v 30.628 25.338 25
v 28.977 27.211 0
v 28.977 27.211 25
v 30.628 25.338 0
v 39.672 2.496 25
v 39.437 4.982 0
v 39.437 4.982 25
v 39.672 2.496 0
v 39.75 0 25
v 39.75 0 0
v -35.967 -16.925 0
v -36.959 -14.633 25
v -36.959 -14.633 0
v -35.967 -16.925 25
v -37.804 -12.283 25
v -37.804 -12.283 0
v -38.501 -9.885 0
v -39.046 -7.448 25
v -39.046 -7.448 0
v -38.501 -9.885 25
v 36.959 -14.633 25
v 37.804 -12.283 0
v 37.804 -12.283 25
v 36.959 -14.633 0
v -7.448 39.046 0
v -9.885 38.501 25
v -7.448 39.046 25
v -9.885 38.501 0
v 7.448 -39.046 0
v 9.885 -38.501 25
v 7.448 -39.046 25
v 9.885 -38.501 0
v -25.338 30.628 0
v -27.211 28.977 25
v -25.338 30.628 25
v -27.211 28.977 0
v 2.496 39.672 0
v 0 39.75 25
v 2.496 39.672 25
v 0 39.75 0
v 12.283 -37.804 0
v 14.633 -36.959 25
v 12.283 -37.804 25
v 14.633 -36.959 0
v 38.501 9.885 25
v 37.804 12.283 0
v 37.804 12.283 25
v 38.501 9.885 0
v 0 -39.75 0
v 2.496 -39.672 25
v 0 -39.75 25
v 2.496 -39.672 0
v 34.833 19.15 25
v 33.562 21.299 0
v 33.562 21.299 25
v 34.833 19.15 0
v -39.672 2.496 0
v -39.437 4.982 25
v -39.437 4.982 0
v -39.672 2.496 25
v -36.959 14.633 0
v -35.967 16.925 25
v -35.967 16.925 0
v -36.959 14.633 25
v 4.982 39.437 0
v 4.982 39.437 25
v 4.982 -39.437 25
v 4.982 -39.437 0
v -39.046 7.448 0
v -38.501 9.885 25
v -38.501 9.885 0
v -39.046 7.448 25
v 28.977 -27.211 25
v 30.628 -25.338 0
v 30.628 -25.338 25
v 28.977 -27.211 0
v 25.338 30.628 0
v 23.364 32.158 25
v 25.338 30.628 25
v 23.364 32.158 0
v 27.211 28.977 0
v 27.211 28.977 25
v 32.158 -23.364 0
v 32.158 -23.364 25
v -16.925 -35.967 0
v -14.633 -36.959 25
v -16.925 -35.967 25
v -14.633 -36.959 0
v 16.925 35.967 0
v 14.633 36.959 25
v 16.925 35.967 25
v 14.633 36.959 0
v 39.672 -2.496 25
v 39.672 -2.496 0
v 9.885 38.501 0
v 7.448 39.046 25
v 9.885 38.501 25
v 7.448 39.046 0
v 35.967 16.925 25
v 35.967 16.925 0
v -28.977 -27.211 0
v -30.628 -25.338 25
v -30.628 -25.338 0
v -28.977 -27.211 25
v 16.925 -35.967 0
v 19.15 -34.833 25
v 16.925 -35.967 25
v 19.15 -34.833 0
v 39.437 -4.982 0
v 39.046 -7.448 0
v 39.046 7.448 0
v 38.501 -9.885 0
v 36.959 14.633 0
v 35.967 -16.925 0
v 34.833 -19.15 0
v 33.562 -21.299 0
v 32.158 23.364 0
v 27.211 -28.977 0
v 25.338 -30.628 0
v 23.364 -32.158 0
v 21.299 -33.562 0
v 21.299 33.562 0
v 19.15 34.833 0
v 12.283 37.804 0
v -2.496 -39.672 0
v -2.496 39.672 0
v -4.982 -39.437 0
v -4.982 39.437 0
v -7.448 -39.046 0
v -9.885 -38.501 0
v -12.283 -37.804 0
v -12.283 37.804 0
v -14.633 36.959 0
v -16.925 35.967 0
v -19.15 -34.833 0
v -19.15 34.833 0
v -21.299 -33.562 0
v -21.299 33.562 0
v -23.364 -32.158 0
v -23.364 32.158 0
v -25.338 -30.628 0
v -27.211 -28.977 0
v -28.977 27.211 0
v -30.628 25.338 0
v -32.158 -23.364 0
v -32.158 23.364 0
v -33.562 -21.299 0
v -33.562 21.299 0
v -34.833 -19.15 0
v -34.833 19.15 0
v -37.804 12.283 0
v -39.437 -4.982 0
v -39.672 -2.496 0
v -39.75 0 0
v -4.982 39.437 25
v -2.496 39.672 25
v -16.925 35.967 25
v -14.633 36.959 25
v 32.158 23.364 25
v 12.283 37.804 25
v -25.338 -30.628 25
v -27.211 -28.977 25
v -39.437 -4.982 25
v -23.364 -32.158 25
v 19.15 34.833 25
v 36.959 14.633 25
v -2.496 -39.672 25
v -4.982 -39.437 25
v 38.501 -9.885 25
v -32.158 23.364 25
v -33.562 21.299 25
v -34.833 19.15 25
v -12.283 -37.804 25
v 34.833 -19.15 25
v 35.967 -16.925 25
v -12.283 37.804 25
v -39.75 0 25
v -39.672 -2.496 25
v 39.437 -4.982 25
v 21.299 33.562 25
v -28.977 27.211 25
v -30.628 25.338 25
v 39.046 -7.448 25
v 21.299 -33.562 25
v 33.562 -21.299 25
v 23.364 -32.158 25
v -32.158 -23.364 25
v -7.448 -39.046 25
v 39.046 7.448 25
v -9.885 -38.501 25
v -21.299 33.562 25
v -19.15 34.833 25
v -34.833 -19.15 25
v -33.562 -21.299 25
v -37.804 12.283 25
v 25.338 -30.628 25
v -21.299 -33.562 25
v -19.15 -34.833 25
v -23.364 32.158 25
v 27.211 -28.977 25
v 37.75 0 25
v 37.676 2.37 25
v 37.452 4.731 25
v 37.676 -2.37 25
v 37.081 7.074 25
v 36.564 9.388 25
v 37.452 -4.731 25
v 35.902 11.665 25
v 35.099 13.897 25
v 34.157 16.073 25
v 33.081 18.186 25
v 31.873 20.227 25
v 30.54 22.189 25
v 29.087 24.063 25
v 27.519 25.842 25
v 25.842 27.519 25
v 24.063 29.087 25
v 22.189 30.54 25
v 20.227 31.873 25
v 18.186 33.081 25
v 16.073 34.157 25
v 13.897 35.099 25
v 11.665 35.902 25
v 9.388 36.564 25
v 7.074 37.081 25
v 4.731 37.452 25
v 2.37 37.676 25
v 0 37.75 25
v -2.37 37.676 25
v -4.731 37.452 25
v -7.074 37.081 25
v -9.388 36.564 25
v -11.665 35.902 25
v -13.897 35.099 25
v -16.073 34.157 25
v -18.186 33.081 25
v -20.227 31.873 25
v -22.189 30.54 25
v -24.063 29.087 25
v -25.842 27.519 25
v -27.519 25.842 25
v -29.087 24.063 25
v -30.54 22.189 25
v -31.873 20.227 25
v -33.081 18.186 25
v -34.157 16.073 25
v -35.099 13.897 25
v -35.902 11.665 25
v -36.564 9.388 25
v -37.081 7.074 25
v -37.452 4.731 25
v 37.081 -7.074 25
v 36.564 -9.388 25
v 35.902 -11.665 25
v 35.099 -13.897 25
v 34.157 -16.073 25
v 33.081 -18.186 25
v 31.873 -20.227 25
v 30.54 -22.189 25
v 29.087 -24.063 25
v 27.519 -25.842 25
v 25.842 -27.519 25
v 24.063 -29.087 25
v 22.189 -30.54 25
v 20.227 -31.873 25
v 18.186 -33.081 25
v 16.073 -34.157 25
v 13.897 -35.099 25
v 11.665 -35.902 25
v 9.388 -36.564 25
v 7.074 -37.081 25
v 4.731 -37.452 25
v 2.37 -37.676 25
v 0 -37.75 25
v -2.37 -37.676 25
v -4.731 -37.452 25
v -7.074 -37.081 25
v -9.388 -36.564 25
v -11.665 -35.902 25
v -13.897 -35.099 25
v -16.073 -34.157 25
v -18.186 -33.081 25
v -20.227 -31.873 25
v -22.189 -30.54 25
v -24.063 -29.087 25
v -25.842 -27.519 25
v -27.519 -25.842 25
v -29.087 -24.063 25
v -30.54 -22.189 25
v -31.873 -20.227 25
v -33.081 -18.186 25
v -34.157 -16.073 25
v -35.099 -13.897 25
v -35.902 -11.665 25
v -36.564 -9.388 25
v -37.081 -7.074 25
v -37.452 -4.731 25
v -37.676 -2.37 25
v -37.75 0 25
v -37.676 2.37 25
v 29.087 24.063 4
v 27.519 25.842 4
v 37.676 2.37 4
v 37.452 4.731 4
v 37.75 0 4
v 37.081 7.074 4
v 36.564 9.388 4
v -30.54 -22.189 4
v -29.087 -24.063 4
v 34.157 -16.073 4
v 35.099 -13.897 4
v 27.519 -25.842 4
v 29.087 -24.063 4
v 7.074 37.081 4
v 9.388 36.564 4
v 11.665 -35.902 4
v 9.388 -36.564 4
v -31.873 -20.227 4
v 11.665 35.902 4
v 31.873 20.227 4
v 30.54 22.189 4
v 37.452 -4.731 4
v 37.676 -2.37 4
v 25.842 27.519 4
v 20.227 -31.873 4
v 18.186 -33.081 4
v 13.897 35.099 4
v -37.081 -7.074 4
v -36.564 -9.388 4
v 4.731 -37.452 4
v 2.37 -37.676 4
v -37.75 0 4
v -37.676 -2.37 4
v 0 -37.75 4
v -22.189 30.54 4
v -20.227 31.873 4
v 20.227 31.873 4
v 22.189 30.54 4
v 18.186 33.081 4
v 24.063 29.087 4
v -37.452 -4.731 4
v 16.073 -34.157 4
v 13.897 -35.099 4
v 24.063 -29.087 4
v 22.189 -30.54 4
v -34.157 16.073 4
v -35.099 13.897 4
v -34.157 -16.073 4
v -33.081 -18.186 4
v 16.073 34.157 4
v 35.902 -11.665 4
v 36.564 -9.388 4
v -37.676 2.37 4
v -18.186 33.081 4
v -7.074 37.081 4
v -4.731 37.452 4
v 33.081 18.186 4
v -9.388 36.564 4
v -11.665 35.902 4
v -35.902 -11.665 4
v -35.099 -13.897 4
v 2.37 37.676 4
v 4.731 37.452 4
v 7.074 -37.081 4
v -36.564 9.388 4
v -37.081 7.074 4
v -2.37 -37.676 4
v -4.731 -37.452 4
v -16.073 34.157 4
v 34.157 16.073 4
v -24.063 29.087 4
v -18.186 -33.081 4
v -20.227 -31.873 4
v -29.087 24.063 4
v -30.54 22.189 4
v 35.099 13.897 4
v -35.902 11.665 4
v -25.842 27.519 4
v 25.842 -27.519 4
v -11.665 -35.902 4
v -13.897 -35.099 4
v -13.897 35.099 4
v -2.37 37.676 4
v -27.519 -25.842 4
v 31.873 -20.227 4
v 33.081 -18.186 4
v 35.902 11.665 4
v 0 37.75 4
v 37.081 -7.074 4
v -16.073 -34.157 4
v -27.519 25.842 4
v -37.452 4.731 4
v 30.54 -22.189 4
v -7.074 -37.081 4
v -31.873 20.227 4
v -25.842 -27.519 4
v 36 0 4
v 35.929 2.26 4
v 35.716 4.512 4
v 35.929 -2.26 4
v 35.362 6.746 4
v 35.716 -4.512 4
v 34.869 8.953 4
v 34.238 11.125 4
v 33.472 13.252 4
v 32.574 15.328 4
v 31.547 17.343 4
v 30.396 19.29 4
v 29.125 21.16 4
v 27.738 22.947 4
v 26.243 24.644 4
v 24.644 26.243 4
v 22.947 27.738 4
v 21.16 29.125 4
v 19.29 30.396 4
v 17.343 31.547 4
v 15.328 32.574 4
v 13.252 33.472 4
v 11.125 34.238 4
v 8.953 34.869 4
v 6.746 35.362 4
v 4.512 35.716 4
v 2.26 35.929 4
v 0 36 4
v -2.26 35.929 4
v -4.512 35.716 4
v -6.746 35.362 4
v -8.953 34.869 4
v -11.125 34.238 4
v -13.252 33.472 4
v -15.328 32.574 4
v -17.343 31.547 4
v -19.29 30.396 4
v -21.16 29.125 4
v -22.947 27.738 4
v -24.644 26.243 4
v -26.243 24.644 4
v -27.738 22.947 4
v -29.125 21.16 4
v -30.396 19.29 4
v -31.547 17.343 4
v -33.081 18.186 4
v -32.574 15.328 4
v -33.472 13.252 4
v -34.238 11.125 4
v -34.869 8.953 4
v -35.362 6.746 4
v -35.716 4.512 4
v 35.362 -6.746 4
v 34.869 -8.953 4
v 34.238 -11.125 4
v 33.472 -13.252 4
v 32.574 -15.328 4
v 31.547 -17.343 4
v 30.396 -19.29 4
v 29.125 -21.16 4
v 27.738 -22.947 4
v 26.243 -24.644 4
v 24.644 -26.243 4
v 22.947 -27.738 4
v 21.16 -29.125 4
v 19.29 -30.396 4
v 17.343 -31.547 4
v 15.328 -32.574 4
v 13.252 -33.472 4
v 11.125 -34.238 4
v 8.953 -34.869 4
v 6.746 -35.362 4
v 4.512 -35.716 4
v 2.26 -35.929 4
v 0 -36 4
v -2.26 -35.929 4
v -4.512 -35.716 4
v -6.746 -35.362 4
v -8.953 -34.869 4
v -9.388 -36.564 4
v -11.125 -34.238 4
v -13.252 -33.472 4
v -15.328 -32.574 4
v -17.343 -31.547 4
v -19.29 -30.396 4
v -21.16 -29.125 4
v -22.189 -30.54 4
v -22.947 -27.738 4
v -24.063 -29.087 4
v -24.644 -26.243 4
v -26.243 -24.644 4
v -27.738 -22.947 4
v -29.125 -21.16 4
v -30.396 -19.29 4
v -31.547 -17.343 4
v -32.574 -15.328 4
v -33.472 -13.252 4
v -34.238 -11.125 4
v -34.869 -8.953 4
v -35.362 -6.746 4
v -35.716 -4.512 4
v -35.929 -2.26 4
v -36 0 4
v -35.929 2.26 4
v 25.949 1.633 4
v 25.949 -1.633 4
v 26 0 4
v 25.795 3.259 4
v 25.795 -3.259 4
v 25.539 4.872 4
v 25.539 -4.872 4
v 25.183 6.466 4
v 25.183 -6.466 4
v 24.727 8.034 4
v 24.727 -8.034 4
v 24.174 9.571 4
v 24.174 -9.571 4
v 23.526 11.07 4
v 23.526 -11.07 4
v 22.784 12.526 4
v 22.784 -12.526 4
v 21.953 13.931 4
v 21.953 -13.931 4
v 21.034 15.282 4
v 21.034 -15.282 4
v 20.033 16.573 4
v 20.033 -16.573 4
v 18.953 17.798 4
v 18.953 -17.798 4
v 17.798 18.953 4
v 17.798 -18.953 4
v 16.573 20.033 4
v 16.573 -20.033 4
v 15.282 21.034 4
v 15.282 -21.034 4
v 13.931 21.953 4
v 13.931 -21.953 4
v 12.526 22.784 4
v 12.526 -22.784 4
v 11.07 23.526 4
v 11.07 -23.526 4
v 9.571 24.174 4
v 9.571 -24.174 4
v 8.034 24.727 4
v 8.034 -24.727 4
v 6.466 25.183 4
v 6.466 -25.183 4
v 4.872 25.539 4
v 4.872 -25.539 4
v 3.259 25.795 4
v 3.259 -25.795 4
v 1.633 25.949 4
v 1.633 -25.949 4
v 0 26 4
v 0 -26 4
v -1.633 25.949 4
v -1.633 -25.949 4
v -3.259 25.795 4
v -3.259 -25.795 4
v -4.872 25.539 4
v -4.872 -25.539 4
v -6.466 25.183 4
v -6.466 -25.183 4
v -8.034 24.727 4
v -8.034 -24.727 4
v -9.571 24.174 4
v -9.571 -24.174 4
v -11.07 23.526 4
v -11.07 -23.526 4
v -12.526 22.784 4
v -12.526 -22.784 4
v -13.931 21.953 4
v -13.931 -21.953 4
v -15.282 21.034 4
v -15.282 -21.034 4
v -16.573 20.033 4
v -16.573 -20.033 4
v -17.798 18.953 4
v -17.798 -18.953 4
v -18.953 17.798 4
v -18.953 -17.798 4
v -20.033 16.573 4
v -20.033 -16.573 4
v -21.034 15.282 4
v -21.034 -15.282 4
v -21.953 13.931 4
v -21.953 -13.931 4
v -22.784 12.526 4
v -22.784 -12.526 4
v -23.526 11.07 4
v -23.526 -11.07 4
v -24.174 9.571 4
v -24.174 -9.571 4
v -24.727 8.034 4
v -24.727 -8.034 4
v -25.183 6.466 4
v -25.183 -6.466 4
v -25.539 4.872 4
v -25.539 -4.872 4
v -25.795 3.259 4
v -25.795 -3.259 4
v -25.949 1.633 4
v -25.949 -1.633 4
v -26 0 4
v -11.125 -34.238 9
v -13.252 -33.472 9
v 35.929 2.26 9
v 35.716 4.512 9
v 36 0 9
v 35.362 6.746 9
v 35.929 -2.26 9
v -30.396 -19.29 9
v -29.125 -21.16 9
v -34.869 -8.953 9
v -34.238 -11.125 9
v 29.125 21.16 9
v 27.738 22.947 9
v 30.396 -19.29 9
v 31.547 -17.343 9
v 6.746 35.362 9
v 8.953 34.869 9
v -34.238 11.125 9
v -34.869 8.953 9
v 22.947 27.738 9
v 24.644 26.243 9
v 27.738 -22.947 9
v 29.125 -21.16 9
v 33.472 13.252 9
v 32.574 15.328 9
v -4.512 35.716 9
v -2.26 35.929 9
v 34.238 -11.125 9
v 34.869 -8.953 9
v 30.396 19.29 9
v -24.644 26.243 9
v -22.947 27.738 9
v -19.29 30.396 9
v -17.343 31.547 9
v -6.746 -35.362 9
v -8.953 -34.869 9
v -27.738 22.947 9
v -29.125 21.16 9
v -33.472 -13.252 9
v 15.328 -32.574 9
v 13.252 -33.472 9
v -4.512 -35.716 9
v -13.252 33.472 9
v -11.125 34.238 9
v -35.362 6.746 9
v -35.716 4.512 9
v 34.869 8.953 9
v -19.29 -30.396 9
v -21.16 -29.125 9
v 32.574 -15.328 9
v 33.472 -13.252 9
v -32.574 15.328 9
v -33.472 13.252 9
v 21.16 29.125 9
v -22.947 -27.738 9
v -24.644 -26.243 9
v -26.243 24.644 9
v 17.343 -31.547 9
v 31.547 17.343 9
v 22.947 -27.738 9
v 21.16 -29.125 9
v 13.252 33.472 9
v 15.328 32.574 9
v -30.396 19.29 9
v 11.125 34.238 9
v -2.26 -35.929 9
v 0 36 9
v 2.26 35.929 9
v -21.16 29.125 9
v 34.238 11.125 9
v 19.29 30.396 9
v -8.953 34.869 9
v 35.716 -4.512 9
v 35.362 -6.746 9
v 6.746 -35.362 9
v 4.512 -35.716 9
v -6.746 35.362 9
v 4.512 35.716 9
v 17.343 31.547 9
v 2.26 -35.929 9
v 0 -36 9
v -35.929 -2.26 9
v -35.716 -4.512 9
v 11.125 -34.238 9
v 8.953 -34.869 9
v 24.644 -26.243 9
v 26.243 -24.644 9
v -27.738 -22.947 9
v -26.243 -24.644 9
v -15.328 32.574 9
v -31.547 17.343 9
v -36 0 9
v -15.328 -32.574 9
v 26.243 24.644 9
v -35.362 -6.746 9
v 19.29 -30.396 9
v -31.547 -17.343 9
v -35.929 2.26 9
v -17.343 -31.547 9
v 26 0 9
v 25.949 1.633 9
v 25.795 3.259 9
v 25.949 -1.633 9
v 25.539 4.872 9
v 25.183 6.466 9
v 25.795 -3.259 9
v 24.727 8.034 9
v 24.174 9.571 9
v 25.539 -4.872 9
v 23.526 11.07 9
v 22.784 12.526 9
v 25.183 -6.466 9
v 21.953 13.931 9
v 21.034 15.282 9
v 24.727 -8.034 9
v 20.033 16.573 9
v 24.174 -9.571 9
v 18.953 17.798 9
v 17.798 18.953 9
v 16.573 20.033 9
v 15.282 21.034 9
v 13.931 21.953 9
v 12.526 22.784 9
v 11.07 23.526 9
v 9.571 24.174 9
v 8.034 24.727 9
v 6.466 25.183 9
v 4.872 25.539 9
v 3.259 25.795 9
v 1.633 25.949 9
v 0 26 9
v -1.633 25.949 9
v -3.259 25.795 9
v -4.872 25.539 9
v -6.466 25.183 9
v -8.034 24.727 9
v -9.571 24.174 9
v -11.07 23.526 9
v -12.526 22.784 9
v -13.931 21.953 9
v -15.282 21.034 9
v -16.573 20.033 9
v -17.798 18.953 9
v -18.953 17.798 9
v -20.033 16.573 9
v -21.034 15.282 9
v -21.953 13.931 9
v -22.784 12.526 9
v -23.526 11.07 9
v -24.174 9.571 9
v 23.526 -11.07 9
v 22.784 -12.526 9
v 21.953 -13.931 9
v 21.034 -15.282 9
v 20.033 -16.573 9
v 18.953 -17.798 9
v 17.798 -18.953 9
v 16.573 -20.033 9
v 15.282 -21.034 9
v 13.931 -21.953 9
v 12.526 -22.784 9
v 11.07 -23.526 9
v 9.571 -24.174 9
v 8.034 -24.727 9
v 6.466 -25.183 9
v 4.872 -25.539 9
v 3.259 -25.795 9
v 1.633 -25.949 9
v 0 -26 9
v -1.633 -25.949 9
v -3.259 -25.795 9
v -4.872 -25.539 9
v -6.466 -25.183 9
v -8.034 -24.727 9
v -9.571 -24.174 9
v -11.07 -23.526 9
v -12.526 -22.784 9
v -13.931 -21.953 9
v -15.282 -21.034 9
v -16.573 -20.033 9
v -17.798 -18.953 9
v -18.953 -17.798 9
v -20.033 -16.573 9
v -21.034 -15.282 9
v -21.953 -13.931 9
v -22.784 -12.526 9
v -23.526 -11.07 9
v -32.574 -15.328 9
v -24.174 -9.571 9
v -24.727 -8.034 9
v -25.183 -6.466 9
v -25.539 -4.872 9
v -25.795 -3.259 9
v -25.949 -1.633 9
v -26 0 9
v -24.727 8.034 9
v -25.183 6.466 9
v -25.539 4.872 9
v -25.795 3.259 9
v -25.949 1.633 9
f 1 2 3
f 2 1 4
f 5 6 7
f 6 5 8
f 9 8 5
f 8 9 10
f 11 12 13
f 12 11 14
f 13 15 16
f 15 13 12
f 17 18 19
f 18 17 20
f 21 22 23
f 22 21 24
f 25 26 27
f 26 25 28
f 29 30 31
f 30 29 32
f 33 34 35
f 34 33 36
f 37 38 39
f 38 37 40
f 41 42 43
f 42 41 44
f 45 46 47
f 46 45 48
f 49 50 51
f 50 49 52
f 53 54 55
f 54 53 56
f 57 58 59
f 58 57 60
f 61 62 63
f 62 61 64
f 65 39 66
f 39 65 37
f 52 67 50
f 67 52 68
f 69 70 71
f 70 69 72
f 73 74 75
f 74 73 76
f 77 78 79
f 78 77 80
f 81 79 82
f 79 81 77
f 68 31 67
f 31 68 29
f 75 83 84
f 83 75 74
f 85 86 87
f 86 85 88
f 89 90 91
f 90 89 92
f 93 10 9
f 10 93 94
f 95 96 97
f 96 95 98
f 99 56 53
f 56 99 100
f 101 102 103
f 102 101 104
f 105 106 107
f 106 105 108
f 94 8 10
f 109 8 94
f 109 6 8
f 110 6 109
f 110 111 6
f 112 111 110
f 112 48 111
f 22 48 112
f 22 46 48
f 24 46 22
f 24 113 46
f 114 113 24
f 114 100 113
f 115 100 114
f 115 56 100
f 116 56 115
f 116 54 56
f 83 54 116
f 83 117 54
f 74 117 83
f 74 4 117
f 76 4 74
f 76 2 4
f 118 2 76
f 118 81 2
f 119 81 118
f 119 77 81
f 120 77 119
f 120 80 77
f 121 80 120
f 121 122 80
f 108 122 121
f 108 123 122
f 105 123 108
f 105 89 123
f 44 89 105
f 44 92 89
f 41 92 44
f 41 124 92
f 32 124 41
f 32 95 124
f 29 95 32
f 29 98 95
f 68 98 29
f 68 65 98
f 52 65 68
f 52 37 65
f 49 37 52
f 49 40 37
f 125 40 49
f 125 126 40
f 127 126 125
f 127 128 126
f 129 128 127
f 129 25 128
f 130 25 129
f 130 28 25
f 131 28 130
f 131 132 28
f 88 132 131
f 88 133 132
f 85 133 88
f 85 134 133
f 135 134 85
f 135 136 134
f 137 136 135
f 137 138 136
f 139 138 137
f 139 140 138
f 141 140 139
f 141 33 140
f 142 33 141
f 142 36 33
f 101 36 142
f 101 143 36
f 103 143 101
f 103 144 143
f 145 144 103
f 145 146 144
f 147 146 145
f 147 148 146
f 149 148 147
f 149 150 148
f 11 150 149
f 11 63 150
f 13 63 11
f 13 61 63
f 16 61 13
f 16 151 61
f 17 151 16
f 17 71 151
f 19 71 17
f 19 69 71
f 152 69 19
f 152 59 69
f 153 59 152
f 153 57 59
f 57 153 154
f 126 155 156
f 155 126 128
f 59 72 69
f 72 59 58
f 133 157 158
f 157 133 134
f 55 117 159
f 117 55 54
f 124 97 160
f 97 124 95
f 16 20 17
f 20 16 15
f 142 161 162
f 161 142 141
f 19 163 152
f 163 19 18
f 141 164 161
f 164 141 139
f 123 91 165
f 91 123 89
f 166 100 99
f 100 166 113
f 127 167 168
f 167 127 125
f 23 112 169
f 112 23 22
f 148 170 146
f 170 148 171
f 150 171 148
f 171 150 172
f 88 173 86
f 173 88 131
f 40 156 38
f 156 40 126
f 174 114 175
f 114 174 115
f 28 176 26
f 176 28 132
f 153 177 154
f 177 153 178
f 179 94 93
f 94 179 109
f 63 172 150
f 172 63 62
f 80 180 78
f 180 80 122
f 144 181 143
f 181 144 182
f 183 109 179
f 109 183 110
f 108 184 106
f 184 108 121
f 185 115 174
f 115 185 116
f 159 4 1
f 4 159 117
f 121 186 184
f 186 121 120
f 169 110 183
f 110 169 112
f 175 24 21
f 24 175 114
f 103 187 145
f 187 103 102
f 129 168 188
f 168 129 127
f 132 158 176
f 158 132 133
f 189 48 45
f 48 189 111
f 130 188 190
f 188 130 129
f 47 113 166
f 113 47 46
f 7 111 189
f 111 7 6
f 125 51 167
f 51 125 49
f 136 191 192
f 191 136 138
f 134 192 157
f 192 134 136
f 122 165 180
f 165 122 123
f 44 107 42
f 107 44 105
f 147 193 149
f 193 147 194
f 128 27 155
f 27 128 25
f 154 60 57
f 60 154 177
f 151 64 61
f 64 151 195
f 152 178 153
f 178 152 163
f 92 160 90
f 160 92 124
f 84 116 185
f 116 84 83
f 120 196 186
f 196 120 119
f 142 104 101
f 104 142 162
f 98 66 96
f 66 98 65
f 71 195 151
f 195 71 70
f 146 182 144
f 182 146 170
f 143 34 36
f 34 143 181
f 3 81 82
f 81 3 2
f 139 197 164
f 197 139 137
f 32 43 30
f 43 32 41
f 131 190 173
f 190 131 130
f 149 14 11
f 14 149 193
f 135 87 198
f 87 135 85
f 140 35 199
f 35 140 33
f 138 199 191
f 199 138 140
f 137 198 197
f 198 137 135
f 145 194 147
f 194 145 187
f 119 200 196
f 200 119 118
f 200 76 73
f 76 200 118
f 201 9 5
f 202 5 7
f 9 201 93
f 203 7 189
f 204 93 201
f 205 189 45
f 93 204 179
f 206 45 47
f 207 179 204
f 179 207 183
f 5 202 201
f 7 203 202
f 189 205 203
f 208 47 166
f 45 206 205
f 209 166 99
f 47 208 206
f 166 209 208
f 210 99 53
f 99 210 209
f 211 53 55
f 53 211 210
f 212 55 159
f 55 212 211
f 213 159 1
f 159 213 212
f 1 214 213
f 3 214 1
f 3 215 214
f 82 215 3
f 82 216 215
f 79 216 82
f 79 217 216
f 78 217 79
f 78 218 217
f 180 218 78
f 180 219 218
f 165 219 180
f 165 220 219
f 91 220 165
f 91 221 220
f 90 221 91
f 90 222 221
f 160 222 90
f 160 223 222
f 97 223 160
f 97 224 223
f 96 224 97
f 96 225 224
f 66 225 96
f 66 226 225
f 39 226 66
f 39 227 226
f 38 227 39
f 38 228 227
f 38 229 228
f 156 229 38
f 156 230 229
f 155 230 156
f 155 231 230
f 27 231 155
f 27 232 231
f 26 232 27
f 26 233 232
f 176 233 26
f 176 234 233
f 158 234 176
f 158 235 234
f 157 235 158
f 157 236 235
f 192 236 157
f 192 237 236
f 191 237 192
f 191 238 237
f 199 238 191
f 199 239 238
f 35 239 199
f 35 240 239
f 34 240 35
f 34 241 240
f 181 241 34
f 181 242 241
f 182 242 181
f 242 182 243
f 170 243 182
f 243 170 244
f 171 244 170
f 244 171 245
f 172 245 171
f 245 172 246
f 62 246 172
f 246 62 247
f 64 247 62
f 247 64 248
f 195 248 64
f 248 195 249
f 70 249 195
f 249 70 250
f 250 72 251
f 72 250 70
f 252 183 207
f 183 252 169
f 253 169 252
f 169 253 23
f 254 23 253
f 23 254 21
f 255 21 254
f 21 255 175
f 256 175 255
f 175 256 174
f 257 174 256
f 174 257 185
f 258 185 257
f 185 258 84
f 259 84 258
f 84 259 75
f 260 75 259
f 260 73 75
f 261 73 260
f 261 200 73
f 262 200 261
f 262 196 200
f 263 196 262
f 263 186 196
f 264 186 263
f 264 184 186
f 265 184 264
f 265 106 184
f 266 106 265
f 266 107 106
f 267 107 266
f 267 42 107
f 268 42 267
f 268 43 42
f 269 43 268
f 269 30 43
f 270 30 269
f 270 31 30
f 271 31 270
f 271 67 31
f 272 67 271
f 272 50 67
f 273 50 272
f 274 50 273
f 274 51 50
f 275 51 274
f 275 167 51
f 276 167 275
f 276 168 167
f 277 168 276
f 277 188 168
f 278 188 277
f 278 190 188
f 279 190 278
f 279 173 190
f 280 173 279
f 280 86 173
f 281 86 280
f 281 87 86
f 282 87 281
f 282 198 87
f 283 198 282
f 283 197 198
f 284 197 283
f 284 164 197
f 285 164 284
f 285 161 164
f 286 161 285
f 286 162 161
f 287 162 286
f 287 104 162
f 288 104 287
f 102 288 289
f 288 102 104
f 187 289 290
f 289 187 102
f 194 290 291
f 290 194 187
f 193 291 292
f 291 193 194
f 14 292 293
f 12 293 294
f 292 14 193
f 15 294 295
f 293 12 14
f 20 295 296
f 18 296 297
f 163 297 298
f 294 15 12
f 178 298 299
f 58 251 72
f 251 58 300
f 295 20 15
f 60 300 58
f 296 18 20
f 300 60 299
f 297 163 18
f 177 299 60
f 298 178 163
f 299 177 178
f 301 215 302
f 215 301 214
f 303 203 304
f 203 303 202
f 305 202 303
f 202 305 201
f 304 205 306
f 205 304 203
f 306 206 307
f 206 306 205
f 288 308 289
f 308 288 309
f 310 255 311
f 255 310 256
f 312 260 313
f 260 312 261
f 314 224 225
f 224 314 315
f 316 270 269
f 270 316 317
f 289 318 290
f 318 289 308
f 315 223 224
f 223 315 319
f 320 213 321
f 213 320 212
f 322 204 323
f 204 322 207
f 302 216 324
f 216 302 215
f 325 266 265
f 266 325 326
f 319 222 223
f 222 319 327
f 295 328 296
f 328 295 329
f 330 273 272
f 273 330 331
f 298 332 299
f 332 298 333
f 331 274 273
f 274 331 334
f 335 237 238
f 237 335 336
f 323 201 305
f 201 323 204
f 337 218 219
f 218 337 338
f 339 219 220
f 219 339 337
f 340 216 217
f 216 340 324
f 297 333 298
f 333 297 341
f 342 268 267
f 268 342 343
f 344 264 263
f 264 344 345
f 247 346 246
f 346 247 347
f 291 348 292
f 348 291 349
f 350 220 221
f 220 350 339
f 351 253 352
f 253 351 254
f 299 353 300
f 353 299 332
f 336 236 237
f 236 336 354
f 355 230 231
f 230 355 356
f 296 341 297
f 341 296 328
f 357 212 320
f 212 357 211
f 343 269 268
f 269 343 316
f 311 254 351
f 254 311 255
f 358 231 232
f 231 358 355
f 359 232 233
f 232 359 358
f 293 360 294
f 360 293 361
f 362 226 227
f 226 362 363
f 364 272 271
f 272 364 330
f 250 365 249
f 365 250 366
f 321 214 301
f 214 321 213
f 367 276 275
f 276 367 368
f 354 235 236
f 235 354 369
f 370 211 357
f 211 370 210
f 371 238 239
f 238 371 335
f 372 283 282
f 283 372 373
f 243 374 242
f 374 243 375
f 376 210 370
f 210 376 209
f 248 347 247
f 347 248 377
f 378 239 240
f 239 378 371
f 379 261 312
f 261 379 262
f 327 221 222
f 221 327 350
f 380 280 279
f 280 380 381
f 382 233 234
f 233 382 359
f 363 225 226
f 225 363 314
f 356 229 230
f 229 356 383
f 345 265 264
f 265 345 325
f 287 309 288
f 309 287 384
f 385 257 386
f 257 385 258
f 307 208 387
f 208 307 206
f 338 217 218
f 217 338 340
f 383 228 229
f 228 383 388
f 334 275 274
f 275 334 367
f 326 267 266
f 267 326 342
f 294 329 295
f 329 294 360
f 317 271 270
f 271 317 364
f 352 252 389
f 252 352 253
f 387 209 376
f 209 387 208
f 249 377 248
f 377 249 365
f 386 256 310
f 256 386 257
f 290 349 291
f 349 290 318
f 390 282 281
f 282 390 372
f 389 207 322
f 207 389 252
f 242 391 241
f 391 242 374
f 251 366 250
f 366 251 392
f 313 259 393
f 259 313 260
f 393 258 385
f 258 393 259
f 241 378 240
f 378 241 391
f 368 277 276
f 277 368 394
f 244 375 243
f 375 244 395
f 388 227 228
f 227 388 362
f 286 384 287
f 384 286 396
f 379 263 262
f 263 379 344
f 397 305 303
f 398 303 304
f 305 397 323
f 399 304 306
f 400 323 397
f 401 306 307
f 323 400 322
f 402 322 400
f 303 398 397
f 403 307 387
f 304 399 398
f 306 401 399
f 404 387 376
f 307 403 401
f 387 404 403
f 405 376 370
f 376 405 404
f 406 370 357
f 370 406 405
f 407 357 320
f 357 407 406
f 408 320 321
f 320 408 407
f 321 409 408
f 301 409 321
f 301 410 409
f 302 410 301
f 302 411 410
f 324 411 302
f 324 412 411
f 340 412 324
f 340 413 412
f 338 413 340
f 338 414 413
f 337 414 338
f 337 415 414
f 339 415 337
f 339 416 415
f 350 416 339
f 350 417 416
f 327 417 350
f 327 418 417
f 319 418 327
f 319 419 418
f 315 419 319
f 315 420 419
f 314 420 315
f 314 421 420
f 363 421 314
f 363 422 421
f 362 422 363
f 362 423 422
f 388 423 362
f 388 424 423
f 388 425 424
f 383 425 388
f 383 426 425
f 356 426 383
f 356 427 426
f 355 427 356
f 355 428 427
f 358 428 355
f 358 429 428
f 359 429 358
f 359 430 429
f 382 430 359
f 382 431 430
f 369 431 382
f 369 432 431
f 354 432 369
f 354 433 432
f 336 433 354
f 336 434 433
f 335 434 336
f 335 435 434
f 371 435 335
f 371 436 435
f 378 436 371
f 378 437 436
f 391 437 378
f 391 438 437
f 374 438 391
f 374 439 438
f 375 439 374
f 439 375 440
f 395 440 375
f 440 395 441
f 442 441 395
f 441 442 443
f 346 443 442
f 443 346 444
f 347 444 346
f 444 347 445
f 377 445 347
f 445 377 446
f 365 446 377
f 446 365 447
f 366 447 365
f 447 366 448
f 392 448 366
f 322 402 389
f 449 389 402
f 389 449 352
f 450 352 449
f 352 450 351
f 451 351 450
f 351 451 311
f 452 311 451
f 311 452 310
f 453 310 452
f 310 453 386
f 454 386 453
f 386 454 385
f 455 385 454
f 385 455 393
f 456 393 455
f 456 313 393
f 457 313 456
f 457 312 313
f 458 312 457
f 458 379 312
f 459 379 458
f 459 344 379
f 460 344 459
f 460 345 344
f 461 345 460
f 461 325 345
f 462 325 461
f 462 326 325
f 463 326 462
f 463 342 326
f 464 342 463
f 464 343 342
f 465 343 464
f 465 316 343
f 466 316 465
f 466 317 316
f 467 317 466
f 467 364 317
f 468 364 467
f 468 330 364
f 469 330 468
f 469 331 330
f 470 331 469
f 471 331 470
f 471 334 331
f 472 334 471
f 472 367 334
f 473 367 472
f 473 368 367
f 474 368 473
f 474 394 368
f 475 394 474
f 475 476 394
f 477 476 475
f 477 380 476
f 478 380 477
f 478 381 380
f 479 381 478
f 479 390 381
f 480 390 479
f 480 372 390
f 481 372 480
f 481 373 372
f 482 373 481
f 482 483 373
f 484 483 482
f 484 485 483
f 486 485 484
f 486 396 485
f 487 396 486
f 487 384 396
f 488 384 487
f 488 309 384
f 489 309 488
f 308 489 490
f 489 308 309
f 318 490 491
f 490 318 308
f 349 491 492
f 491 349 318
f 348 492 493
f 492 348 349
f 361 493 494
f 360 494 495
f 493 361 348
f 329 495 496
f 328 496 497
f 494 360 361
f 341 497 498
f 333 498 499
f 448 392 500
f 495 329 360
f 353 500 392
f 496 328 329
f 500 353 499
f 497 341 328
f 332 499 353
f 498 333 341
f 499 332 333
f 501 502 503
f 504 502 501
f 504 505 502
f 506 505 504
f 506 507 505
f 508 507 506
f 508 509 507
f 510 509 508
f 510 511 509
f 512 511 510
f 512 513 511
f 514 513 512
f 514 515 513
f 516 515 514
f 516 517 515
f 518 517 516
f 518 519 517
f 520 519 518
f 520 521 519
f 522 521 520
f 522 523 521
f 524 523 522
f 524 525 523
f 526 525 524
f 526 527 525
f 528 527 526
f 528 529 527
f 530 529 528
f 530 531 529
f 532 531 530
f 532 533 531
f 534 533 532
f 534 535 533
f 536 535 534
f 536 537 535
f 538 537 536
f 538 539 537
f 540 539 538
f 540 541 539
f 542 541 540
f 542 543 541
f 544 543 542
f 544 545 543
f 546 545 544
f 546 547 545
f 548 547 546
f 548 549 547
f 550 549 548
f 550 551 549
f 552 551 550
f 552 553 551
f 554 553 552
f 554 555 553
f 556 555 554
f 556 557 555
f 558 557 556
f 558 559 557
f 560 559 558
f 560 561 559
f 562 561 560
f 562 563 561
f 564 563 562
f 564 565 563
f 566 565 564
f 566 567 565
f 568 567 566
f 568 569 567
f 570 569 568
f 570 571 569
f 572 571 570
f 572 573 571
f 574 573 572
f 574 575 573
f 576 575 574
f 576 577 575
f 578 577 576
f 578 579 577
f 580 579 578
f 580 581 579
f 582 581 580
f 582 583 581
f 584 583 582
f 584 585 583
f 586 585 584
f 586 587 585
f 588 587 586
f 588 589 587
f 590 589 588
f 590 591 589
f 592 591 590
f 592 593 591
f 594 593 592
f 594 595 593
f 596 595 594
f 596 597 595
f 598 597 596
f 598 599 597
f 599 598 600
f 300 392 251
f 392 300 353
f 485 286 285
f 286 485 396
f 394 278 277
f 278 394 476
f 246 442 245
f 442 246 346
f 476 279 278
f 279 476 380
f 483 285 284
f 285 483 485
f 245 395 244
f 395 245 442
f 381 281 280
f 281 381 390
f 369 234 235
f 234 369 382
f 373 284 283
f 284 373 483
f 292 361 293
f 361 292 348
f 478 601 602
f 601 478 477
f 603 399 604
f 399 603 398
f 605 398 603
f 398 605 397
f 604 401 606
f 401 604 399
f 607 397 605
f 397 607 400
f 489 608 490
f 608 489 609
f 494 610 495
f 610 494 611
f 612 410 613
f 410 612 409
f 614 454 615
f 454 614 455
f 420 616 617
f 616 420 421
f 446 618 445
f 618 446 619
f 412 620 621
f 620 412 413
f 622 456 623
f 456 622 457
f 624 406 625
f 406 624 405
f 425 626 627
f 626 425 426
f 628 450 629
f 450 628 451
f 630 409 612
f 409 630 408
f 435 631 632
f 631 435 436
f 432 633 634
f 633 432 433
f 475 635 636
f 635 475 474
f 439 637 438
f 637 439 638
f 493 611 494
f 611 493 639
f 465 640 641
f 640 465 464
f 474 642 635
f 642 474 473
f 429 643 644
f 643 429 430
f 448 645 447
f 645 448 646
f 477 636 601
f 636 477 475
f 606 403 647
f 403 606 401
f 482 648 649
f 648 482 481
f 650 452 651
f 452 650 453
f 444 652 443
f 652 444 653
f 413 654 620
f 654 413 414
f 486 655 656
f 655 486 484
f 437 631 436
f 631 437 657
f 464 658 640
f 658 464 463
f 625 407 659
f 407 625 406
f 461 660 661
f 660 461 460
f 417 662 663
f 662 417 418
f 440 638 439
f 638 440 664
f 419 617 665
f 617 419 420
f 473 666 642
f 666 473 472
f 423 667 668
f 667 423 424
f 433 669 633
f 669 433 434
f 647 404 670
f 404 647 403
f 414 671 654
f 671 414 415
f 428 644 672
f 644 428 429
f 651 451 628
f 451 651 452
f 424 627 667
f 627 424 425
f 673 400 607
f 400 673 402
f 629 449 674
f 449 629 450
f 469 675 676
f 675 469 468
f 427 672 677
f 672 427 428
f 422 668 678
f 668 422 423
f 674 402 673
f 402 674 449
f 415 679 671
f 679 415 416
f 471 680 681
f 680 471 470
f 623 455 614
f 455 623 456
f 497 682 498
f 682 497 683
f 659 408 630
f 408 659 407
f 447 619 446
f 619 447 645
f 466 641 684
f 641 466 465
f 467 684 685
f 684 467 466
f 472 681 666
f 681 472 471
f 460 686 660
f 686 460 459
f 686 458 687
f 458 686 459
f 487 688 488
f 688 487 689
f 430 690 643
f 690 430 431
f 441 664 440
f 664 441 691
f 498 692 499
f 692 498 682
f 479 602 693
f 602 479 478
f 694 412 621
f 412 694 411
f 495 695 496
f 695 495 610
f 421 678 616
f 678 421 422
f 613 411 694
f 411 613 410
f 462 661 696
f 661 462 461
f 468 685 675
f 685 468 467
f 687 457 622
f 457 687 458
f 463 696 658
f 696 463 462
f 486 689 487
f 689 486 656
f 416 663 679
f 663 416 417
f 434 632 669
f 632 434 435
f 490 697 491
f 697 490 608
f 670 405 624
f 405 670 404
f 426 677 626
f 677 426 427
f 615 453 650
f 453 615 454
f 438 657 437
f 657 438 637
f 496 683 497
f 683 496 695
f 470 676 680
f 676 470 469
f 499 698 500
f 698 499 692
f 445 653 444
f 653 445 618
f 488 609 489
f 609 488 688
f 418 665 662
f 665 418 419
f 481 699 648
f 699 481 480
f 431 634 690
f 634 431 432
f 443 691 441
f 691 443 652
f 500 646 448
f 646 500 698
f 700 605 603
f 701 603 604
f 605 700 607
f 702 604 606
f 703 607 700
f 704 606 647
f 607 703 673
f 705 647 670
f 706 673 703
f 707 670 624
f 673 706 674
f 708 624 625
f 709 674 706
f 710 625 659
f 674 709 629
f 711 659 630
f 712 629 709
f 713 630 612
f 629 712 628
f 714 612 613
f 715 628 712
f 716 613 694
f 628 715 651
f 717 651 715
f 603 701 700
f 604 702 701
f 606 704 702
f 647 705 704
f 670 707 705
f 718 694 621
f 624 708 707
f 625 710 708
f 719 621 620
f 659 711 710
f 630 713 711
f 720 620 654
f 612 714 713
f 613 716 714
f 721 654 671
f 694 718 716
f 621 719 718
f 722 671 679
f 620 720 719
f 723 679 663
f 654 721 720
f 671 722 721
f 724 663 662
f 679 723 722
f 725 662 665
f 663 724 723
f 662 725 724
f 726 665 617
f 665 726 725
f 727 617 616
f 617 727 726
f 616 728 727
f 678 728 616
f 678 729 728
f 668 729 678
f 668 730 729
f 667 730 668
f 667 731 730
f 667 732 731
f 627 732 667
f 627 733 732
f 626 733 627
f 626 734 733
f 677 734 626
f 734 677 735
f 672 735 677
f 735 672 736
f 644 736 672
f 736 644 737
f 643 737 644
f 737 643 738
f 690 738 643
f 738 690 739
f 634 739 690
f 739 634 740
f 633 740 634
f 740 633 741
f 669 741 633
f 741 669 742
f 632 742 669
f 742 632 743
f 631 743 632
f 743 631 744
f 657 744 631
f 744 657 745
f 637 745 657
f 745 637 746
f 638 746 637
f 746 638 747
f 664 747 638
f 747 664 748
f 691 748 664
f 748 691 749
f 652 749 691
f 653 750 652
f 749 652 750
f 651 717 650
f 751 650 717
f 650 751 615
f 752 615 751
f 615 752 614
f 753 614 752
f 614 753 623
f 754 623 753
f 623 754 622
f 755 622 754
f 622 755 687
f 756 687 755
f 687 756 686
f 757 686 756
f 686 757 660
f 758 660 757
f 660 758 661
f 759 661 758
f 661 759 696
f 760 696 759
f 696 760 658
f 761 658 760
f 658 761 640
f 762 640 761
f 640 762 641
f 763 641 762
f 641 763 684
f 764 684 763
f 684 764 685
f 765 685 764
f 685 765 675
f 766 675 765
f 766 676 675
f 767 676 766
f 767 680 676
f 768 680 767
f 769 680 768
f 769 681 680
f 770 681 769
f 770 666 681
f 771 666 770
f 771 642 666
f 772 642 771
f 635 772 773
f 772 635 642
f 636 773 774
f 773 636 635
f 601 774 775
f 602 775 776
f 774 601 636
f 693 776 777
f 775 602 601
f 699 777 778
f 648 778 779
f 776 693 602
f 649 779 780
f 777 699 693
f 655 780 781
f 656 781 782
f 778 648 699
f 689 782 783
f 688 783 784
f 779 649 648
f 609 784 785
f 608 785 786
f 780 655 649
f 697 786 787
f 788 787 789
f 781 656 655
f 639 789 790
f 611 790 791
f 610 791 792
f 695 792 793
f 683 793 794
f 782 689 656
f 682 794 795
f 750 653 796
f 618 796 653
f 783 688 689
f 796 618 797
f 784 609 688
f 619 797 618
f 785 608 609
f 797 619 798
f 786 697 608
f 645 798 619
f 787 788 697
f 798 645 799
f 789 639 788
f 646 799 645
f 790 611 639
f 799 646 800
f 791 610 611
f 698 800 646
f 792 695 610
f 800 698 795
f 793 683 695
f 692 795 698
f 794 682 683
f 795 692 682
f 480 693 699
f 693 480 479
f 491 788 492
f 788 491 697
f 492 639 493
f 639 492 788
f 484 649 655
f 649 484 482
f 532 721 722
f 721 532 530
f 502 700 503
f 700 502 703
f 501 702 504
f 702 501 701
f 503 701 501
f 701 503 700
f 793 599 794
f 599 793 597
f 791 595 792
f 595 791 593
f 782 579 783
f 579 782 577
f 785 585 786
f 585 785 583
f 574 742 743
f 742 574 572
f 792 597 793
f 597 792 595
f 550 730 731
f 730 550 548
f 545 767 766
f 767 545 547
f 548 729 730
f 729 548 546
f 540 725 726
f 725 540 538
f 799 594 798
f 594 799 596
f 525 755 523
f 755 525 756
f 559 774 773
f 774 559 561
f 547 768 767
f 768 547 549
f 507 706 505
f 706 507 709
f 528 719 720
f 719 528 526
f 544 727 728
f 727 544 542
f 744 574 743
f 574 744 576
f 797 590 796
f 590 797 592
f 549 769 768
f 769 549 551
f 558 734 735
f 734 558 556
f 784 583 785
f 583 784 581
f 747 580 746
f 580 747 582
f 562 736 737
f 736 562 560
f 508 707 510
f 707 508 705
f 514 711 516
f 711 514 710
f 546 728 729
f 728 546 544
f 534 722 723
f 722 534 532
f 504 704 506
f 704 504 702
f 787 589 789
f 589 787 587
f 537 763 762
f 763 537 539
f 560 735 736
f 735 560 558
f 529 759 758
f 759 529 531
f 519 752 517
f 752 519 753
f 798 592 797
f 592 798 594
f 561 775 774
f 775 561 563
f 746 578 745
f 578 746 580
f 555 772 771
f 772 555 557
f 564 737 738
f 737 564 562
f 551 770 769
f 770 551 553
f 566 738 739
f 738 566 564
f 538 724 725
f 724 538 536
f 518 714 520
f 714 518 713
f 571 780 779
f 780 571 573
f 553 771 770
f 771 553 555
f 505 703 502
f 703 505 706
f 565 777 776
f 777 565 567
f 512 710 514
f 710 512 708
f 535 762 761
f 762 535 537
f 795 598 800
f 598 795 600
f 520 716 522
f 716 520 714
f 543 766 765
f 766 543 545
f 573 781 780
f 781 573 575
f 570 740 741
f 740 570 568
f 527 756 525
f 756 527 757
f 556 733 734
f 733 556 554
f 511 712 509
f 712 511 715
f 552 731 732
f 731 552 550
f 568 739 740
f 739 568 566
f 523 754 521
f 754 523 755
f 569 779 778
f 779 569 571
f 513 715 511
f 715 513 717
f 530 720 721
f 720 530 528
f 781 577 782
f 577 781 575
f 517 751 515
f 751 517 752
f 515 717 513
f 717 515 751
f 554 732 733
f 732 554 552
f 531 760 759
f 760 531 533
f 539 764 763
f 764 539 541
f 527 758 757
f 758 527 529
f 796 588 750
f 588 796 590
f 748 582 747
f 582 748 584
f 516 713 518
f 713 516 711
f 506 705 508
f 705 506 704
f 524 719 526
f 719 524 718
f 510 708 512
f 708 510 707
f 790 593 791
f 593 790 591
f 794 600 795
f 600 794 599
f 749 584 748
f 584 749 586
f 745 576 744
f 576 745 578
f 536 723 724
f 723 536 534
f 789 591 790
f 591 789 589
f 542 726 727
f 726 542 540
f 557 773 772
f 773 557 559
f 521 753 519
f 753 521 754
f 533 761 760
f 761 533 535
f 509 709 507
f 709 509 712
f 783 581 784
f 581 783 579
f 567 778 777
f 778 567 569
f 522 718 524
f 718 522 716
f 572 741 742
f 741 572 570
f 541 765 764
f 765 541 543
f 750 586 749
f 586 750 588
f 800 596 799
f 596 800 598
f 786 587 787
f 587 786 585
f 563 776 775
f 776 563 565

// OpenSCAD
// file: LensCover.scad
$fn = 100;

module lens_cover(r, ri, h, t){
    difference(){
        cylinder(r=r+t, h=h);
        translate([0, 0, 4]) cylinder(r=r, h=h);
    }

    difference(){
        cylinder(r=ri, h=9);
        translate([0, 0, 4]) cylinder(r=ri-10, h=h);
    }
}

lens_cover(
     r=41.5,
     ri=38,
     h=39,
     t=2);
// main file
use <LensCover.scad>

$fn = 100;

DIA_EXT = 75.5; // External diameter of the lens
DIA_INT = 72; // Internal diameter of the lens
WALL_THICKNESS = 2;
CAP_HEIGHT = 25;

lens_cover(
     r=DIA_EXT/2,
     ri=DIA_INT/2,
     h=CAP_HEIGHT,
     t=WALL_THICKNESS);
